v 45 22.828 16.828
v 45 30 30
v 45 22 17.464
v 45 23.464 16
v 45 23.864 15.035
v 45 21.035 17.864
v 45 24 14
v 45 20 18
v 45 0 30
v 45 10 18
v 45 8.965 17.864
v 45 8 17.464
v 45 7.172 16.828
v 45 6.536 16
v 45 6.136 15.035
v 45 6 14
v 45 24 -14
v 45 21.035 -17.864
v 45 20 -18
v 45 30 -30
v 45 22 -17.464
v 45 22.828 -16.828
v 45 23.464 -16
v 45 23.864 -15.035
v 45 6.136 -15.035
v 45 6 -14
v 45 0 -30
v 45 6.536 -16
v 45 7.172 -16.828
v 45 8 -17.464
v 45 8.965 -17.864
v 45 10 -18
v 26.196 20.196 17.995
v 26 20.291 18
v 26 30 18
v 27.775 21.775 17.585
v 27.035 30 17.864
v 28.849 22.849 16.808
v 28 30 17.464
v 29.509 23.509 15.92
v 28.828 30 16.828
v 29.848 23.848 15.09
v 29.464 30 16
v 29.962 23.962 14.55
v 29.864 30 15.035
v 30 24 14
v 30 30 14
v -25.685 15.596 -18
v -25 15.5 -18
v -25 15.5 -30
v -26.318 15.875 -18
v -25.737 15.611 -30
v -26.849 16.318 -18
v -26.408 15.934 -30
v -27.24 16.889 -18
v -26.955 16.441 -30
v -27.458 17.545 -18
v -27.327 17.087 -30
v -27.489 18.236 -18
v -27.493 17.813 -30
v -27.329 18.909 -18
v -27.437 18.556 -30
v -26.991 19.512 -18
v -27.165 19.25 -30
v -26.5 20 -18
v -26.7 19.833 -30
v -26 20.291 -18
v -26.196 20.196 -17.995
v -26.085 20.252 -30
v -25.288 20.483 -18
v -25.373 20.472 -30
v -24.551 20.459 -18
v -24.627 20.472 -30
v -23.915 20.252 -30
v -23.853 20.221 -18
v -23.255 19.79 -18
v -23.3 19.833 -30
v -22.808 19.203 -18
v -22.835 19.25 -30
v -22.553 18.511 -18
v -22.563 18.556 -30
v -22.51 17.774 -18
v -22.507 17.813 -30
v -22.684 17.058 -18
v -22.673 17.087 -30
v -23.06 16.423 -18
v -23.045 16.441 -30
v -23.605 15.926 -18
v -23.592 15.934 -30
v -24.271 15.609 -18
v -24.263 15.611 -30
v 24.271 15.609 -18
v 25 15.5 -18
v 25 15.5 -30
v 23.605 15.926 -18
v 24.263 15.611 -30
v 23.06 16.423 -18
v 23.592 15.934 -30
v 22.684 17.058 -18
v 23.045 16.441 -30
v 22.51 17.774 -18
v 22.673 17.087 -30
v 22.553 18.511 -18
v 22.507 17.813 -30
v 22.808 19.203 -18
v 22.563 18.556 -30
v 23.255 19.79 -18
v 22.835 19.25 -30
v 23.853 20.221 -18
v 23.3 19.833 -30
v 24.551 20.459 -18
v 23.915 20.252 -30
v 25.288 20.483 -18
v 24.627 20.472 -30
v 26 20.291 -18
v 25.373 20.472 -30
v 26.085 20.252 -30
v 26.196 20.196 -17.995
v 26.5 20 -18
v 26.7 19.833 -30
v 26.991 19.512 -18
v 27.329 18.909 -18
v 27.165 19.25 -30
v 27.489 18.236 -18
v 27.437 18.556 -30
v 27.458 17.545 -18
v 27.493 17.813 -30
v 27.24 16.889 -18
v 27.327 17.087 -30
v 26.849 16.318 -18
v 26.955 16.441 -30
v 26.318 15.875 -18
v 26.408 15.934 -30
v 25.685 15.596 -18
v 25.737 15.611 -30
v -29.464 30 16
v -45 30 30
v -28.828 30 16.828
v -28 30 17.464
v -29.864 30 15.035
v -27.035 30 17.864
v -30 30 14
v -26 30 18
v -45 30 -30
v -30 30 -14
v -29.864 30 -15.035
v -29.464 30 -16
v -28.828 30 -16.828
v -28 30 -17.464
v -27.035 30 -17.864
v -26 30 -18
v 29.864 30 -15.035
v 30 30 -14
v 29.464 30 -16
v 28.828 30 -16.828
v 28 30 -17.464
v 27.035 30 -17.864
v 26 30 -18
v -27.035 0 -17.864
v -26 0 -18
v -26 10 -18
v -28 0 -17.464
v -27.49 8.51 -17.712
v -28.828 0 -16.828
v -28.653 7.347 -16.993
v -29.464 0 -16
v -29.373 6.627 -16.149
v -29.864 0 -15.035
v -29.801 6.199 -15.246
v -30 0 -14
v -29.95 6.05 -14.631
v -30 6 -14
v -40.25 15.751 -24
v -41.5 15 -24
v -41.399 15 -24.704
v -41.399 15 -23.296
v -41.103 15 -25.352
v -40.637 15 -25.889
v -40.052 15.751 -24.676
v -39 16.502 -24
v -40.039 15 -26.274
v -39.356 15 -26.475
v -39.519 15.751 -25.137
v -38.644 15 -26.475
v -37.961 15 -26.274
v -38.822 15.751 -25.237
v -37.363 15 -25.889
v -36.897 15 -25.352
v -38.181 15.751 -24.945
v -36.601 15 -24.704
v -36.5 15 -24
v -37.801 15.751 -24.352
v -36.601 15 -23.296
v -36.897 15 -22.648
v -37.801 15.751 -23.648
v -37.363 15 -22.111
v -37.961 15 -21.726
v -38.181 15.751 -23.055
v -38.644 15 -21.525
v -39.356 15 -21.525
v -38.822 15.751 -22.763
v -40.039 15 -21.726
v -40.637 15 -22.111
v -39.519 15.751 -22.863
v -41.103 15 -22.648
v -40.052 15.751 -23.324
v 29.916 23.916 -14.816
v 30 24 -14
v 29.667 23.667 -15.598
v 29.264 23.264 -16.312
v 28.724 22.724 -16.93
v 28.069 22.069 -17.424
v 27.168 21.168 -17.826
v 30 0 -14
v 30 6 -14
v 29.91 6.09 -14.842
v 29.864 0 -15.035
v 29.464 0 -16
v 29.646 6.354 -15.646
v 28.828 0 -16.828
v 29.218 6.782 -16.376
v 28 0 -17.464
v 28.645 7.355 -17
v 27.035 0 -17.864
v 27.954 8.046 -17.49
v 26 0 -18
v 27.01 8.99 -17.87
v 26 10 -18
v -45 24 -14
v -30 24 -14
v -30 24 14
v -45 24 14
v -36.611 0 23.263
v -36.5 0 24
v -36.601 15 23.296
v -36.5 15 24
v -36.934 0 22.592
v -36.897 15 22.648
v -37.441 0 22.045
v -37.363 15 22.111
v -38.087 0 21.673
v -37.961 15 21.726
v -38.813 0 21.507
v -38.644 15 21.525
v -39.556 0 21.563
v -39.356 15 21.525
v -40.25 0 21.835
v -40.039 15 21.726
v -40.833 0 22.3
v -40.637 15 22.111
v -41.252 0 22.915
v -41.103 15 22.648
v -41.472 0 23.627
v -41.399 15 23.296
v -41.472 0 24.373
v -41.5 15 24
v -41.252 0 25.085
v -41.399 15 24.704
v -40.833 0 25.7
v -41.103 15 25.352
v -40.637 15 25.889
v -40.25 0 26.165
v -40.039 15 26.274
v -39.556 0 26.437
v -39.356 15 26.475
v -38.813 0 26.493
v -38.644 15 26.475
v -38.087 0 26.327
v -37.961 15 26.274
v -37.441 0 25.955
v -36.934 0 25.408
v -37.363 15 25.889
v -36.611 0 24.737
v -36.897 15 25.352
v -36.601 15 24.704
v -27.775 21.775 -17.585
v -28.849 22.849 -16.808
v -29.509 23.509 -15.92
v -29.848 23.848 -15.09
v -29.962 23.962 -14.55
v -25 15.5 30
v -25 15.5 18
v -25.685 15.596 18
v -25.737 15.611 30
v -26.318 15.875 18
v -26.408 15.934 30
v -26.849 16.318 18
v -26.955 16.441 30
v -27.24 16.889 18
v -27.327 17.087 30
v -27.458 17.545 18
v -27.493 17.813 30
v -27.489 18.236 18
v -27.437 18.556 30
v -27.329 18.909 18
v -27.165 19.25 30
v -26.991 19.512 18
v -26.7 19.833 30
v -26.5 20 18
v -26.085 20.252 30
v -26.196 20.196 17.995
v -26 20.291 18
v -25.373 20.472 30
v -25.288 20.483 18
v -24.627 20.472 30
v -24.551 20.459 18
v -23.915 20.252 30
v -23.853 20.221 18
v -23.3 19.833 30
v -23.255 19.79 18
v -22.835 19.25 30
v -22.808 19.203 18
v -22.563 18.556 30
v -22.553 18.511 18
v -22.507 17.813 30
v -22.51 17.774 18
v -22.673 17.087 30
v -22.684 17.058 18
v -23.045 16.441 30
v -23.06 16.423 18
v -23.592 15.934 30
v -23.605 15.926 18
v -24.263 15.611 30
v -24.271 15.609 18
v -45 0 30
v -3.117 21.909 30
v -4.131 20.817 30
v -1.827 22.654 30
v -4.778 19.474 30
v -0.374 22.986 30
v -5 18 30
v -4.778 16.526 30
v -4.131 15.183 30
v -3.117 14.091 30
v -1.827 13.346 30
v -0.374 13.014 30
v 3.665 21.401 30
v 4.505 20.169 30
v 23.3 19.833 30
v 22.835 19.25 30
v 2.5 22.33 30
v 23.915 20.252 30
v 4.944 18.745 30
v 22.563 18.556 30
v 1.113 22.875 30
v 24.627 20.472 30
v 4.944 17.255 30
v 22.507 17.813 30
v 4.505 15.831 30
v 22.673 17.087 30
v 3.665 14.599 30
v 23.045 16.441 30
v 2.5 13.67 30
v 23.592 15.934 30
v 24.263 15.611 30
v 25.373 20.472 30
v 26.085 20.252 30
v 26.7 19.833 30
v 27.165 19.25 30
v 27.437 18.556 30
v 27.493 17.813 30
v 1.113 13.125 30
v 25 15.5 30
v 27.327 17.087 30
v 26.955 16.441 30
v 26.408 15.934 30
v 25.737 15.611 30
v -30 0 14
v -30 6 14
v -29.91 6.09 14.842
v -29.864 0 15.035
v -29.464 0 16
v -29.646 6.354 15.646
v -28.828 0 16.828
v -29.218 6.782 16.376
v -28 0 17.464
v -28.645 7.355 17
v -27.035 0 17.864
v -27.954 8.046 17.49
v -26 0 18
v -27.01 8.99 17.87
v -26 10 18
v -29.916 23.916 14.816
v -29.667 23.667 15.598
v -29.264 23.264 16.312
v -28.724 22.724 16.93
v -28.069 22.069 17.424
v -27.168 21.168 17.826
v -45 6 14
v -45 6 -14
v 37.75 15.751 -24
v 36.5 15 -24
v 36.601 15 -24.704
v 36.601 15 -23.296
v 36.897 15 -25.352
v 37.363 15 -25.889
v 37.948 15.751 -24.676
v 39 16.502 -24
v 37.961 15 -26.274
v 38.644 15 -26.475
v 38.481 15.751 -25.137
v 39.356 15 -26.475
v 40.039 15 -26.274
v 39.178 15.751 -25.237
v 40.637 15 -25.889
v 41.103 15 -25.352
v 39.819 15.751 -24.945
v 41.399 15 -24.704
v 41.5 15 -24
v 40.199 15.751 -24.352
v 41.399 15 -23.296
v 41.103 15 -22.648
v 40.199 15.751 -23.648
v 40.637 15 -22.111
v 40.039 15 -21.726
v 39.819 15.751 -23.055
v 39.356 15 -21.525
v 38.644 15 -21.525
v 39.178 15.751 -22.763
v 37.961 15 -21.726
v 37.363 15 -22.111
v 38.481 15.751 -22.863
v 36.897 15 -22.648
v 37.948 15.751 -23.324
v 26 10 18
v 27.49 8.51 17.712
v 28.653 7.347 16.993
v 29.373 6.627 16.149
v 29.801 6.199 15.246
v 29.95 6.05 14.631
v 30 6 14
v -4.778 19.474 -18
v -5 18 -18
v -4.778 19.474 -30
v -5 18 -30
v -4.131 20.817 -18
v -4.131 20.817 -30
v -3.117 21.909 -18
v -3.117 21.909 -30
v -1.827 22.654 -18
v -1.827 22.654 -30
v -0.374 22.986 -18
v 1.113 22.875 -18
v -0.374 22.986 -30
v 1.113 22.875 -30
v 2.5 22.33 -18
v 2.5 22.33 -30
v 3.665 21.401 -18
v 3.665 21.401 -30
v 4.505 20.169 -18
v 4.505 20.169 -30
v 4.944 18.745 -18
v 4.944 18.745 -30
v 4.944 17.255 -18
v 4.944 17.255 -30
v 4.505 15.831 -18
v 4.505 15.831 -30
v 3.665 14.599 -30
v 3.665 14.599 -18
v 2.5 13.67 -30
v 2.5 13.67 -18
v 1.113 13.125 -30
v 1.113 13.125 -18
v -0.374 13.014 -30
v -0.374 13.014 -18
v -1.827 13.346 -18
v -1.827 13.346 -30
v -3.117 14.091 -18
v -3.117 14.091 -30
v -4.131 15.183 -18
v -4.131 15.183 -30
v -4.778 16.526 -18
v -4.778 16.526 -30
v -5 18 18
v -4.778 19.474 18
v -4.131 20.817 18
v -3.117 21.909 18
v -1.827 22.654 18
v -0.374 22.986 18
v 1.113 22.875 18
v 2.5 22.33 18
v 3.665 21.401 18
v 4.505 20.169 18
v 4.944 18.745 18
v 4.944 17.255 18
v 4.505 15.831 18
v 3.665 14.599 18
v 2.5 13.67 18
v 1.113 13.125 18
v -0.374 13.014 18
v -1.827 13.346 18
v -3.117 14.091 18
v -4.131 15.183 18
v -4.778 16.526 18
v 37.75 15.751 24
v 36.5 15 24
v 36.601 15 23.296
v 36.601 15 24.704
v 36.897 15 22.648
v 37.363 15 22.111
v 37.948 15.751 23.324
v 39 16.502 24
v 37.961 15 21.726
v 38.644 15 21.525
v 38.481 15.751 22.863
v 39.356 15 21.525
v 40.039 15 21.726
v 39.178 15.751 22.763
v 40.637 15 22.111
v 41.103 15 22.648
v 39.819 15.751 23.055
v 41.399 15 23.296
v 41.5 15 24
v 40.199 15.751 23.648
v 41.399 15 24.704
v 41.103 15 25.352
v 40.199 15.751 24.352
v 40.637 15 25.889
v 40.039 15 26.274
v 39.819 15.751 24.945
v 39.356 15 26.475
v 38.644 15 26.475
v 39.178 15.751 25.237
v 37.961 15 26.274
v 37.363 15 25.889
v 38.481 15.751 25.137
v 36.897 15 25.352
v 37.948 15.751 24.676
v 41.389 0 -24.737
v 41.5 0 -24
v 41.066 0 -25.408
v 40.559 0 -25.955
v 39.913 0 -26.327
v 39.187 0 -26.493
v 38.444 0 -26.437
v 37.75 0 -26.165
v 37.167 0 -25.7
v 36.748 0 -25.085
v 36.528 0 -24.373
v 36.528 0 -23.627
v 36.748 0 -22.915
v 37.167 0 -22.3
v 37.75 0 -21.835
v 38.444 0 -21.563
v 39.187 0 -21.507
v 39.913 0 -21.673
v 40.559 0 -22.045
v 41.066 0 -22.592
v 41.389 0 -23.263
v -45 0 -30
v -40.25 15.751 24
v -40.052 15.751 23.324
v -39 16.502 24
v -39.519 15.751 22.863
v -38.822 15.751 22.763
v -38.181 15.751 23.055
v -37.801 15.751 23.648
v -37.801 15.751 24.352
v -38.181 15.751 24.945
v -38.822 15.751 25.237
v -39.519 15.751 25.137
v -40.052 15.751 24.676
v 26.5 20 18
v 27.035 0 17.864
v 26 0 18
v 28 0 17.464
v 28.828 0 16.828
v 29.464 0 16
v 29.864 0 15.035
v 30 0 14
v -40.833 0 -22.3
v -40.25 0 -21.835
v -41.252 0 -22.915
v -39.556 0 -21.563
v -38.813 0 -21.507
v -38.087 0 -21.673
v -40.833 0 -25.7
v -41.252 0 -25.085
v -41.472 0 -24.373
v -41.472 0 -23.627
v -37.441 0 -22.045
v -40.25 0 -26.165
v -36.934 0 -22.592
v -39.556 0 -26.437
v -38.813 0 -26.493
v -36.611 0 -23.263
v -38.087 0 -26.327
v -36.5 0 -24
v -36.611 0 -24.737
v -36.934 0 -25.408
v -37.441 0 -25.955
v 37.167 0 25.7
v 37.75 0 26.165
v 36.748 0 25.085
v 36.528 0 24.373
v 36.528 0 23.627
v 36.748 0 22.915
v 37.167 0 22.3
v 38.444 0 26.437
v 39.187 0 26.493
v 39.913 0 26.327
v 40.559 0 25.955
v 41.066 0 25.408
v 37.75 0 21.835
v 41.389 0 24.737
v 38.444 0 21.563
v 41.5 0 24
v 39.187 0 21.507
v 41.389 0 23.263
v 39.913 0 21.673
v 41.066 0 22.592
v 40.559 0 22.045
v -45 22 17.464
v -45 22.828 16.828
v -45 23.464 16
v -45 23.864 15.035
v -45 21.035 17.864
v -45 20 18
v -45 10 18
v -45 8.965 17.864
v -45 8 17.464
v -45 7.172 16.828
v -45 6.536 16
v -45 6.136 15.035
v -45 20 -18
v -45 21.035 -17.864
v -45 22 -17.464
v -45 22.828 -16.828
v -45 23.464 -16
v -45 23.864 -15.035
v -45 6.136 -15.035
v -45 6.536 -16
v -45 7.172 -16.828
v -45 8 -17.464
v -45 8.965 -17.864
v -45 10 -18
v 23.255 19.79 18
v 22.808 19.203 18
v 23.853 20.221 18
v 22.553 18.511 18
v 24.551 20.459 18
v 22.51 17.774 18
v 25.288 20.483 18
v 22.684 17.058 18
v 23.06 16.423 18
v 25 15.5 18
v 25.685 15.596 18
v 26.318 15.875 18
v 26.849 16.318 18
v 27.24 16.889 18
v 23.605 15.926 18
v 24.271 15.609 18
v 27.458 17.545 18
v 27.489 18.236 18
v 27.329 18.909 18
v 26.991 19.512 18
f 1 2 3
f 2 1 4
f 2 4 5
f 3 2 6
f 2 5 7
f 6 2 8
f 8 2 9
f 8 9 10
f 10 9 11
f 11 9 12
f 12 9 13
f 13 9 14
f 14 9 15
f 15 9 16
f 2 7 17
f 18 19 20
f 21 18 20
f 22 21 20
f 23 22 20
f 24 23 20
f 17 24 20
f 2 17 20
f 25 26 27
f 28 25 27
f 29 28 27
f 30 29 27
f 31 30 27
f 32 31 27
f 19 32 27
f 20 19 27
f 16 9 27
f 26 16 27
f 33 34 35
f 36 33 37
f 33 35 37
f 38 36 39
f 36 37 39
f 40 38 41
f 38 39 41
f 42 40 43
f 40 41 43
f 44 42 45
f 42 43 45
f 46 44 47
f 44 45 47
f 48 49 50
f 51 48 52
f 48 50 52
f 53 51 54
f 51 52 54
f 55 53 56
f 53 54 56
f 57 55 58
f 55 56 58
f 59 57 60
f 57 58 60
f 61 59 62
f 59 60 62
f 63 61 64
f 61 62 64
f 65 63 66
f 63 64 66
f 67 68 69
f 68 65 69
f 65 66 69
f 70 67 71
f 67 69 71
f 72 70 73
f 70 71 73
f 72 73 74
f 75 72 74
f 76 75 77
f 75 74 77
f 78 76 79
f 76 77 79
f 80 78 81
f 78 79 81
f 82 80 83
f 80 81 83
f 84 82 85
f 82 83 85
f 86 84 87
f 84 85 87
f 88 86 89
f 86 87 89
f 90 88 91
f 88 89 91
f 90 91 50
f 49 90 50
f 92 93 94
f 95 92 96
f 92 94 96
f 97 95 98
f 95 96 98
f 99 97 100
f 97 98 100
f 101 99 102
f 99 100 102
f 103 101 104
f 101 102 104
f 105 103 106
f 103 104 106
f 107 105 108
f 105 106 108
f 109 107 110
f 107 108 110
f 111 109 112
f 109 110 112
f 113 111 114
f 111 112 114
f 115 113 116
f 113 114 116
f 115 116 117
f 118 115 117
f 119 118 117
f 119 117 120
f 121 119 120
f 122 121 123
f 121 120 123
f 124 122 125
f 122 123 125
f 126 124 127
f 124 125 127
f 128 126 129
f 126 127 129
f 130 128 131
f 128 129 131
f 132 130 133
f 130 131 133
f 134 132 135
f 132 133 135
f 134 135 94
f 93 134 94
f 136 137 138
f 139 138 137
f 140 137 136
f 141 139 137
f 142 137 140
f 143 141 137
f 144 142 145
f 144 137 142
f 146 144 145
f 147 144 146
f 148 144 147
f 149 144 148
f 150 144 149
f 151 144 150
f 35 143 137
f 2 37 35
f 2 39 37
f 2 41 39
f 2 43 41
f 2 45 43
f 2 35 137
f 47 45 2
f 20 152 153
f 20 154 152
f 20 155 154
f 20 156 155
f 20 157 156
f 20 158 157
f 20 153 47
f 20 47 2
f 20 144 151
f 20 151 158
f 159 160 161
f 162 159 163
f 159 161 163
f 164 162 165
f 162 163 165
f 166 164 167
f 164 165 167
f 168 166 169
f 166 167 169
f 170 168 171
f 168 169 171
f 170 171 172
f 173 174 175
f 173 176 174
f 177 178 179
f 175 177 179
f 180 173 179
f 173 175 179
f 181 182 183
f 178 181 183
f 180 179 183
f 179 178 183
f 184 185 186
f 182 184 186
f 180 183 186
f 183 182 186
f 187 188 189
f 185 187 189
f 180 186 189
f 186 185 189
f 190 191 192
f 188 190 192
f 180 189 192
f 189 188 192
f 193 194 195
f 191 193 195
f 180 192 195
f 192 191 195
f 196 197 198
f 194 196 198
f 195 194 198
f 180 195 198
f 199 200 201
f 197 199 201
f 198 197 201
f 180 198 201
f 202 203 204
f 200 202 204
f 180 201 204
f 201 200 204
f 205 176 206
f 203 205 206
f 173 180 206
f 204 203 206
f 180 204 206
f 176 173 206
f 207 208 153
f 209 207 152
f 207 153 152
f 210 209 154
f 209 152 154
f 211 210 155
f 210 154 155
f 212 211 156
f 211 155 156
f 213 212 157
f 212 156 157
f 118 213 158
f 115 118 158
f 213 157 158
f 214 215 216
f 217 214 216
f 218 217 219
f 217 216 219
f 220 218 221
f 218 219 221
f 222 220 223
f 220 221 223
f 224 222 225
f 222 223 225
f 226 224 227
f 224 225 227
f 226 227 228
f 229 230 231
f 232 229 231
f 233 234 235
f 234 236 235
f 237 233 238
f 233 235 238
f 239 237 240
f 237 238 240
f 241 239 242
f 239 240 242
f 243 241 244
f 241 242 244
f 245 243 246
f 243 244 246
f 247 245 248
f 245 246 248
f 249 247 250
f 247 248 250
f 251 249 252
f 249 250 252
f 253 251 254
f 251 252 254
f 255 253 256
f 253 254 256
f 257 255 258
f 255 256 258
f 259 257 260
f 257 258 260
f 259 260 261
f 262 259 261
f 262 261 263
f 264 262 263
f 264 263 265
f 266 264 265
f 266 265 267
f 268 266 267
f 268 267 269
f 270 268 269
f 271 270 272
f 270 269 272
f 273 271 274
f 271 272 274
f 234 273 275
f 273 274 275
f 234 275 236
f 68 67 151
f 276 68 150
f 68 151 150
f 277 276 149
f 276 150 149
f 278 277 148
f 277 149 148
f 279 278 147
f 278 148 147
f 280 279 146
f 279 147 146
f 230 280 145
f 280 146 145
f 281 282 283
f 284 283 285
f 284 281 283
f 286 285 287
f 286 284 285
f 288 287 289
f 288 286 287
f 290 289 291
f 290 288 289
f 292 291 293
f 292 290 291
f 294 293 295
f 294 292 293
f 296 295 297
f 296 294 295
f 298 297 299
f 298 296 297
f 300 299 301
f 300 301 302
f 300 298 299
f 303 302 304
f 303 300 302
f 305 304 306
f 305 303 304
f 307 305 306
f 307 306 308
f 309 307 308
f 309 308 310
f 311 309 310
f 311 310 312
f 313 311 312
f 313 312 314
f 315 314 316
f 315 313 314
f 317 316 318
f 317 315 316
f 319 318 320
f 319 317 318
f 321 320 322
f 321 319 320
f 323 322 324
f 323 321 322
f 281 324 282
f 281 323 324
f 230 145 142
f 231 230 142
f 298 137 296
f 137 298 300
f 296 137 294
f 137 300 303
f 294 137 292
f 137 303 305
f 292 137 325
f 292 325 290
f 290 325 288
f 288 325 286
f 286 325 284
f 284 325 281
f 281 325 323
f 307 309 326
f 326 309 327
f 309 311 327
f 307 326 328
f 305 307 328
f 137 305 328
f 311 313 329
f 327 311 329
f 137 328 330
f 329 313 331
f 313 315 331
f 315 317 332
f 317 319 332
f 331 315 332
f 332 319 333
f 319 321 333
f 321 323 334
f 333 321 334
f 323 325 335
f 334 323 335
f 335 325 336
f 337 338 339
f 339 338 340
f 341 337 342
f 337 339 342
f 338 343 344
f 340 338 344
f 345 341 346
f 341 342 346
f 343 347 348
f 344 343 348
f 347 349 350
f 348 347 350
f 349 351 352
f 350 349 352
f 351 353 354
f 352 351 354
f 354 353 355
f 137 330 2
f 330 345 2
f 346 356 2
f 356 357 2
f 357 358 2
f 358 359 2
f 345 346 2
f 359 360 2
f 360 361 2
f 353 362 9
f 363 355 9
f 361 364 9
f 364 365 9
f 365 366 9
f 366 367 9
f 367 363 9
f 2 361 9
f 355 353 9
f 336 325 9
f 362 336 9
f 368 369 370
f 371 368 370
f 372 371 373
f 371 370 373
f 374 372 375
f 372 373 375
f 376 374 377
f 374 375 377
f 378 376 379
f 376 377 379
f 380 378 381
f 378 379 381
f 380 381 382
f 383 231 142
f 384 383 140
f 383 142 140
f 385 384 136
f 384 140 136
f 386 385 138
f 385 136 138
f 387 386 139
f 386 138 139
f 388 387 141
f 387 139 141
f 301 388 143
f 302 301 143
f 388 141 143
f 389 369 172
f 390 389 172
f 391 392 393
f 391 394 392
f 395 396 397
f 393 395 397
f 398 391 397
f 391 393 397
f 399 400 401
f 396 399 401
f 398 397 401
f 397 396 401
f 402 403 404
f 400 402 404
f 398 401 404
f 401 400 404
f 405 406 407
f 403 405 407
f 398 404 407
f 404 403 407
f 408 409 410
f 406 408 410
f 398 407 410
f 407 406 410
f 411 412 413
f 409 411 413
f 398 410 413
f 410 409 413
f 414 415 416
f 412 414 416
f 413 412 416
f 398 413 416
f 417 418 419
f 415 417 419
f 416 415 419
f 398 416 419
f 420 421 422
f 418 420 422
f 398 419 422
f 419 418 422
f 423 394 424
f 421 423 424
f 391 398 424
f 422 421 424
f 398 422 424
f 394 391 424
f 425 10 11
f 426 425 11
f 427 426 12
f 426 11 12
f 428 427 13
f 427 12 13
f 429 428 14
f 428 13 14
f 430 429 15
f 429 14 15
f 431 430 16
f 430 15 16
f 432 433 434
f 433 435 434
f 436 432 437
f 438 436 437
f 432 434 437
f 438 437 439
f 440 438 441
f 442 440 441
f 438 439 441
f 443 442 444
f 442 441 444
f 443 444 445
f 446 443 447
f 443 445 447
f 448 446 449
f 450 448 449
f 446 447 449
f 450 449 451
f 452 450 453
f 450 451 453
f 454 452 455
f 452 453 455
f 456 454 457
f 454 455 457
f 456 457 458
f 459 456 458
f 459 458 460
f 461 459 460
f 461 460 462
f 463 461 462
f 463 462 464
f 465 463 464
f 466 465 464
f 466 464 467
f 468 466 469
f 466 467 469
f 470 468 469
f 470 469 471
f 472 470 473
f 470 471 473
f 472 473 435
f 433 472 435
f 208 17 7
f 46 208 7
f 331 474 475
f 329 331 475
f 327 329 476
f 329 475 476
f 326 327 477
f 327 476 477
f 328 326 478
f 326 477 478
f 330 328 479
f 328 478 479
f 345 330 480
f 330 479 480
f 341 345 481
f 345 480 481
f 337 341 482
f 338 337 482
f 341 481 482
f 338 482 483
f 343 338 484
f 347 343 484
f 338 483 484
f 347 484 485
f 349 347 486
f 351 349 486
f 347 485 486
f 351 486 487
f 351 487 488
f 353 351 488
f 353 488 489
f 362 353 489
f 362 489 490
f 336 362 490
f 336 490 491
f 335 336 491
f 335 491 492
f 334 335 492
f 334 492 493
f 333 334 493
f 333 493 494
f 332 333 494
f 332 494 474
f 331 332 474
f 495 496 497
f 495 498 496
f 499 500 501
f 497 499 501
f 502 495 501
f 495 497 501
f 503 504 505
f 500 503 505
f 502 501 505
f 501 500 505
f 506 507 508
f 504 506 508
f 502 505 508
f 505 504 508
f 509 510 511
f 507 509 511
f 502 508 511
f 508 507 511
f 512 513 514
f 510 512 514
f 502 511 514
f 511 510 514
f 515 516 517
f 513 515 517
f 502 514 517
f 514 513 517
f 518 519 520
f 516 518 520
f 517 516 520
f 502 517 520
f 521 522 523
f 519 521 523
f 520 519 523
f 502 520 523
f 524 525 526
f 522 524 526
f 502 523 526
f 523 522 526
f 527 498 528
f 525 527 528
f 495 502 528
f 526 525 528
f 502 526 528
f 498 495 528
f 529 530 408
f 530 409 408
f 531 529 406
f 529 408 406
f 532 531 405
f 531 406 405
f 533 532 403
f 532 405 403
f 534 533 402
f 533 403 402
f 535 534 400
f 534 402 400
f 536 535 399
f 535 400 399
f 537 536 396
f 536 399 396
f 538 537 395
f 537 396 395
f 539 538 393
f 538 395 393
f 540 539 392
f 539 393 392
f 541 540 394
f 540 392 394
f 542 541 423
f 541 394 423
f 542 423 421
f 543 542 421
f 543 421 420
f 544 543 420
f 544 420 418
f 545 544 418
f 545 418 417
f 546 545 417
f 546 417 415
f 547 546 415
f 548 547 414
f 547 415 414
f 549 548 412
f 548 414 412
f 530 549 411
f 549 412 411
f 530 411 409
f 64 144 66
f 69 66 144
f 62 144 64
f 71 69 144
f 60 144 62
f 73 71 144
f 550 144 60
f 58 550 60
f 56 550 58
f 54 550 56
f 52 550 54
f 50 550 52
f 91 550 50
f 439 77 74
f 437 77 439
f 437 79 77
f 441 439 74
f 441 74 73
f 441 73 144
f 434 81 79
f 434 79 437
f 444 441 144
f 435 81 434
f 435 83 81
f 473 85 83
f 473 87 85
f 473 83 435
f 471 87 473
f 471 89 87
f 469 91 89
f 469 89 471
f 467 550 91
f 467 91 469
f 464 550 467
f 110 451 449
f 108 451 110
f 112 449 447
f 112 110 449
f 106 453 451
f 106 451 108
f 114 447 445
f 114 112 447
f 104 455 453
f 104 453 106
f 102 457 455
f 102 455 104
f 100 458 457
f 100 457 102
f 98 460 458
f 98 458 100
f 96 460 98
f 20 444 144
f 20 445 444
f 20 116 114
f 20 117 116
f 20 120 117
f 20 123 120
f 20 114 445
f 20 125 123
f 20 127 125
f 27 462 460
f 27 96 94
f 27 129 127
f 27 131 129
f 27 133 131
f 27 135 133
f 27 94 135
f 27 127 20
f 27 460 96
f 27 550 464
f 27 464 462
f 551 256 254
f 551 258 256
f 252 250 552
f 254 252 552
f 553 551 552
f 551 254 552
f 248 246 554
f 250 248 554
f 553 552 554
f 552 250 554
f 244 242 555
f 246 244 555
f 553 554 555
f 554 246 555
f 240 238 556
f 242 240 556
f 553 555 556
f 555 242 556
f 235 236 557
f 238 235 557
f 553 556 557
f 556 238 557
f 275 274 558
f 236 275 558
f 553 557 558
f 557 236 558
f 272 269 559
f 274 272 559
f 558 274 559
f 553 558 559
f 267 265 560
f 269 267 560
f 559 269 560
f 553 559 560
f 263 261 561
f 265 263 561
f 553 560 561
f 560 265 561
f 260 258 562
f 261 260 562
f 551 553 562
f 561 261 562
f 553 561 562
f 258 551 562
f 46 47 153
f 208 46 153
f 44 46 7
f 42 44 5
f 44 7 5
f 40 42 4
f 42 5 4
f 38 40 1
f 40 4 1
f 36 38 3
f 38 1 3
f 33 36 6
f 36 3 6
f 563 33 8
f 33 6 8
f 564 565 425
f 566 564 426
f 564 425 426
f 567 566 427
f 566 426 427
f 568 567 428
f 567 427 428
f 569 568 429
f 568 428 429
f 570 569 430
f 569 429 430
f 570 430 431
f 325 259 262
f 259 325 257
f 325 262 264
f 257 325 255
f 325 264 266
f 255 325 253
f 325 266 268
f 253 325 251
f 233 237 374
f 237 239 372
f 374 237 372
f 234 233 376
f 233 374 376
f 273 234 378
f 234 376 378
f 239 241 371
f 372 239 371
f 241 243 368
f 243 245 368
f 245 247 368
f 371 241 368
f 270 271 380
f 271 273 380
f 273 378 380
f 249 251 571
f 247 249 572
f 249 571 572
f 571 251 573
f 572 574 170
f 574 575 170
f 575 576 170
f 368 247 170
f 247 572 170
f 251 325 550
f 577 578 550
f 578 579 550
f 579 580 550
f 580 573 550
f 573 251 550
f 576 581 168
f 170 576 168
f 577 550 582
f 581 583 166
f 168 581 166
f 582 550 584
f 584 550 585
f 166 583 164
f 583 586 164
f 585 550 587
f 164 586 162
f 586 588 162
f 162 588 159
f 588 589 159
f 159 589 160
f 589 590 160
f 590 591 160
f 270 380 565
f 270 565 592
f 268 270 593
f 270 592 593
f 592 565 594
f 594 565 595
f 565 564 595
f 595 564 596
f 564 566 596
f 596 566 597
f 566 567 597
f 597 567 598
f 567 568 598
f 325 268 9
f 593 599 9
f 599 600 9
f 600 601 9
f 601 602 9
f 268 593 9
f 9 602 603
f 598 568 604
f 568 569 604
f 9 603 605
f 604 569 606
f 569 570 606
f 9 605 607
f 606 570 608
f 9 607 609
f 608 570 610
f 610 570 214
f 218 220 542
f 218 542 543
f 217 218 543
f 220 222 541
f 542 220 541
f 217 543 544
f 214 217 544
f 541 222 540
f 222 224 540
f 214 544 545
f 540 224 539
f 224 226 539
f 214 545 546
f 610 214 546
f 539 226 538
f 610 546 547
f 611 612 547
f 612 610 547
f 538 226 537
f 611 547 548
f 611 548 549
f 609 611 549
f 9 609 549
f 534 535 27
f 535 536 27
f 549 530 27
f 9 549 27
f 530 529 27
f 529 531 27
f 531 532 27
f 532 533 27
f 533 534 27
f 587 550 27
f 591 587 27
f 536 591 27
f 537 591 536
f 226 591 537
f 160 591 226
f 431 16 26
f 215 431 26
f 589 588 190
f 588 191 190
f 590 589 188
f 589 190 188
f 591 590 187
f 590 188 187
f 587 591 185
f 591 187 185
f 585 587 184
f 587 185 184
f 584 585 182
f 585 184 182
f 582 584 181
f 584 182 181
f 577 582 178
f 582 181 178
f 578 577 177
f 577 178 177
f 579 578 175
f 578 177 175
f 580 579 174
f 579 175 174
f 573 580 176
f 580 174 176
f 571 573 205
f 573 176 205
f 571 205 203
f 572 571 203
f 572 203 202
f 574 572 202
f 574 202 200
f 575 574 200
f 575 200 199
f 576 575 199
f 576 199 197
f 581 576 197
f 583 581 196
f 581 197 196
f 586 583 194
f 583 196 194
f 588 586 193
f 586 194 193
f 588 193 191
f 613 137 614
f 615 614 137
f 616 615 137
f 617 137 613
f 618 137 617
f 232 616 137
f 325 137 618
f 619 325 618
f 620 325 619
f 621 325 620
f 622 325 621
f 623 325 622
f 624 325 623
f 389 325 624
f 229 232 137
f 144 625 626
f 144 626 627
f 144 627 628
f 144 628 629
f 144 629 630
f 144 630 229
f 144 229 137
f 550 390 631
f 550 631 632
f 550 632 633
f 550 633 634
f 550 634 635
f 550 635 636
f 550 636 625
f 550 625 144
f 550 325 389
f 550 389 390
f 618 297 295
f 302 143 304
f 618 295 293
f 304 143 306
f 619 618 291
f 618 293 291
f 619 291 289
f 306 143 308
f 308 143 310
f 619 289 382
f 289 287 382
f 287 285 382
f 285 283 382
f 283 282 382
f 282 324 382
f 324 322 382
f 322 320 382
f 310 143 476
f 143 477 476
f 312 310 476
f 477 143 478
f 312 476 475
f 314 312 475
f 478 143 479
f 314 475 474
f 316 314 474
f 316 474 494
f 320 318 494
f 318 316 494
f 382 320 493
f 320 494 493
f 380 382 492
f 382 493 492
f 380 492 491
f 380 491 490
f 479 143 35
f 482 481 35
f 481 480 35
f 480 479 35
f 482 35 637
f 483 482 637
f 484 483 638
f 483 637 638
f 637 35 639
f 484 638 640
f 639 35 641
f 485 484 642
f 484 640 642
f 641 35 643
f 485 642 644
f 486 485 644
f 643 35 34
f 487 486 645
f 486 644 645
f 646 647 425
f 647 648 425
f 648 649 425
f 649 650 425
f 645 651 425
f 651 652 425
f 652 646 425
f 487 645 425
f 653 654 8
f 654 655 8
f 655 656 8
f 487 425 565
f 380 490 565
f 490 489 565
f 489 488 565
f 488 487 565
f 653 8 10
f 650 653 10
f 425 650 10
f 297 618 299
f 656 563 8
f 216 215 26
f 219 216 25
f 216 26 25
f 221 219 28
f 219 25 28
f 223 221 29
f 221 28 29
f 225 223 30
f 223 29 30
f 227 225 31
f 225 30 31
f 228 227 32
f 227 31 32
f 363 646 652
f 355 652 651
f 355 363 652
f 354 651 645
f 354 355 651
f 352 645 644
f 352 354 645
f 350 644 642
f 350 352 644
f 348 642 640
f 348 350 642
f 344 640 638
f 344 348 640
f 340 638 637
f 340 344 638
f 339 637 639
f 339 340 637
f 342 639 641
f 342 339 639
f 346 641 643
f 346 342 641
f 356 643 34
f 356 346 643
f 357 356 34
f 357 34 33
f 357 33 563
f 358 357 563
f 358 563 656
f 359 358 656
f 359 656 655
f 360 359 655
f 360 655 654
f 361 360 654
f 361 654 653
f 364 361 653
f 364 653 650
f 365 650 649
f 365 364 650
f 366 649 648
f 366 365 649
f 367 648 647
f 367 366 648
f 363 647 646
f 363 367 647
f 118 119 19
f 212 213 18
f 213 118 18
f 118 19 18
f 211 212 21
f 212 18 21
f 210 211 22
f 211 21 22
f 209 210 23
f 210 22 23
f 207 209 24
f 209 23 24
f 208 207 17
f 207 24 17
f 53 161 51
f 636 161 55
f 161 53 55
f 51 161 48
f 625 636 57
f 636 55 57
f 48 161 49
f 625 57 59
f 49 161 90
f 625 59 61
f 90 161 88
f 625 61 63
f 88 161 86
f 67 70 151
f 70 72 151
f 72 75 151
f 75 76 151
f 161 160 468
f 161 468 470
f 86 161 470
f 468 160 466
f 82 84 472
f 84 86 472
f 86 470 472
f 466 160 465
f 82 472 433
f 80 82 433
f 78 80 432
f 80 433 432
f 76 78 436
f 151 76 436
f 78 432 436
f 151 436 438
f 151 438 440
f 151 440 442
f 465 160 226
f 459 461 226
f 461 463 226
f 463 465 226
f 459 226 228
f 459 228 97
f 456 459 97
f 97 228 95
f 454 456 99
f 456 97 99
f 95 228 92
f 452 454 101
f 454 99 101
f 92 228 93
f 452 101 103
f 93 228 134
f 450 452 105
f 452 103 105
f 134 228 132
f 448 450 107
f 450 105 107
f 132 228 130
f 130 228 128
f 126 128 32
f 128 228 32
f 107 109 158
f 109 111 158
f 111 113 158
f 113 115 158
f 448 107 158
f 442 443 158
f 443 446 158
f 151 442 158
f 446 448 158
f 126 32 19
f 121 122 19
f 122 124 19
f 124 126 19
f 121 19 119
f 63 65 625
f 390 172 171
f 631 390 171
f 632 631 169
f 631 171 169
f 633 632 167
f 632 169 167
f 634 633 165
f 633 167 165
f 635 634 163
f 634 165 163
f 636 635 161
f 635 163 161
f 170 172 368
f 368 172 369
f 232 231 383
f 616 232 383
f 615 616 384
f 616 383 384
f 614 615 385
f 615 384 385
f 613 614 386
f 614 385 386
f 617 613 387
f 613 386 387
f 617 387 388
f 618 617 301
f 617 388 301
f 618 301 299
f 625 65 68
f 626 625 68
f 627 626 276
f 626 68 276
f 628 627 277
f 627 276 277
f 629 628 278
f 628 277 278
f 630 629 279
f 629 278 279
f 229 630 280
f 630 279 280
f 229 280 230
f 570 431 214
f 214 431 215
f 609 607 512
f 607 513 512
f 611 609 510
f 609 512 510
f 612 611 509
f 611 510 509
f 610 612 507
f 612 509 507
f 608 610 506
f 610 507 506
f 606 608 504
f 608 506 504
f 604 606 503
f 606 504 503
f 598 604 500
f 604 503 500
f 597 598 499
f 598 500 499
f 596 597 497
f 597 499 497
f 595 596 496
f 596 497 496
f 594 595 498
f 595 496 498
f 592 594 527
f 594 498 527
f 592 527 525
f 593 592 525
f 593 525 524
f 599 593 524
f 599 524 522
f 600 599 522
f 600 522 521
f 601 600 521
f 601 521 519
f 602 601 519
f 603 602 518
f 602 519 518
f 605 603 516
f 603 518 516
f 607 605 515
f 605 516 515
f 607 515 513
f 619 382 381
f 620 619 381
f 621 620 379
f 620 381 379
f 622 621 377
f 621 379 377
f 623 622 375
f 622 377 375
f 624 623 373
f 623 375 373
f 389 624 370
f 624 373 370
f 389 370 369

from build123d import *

# Parameters (mm, degrees)
SKETCH_1_W                  = 90
SKETCH_1_H                  = 60
EXTRUDE_1_DEPTH             = 30
HOLE_WIZARD_1_D             = 10
HOLE_WIZARD_M6_1_AT_2_COUNT = 2
HOLE_WIZARD_M6_1_AT_2_PITCH = 50
CUT_EXTRUDE_1_DEPTH         = 62.846584384
HOLE_WIZARD_M6_2_D          = 5
HOLE_WIZARD_M6_2_DEPTH      = 15
HOLE_WIZARD_M6_2_TIP        = 1.502151548
CUT_EXTRUDE_2_DEPTH         = 100.498743771


with BuildPart() as part:
    # 草图1 → 凸台-拉伸1 (new body)
    with BuildSketch(Plane(origin=(0, 0, 0), x_dir=(1, 0, 0), z_dir=(0, 1, 0))):
        Rectangle(SKETCH_1_W, SKETCH_1_H)
    extrude(amount=EXTRUDE_1_DEPTH)

    # 孔1 (through all)
    with Locations(Plane.XY.offset(30)):
        with Locations((0, 18)):
            Hole(HOLE_WIZARD_1_D / 2)

    # 草图4 → M6 螺纹孔1 (revolve, cut)
    with BuildSketch(Plane(origin=(-25, 18, 30), x_dir=(0, -1, 0), z_dir=(1, 0, 0))):
        Polygon((0, 0), (0, 16.502151548), (2.5, 15), (2.5, 0), align=None)
    hole_wizard_m6_1 = revolve(axis=Axis((-25, 18, 36.35), (0, 0, -1)), mode=Mode.SUBTRACT)

    # M6 螺纹孔1 at 2: M6 螺纹孔1 ×2
    with Locations(*[(i * HOLE_WIZARD_M6_1_AT_2_PITCH, 0, 0) for i in range(1, HOLE_WIZARD_M6_1_AT_2_COUNT)]):
        add(hole_wizard_m6_1, mode=Mode.SUBTRACT)

    # 镜向1: M6 螺纹孔1 across plane
    add(hole_wizard_m6_1.mirror(Plane.XY), mode=Mode.SUBTRACT)

    # 镜向1 copy 1 sketch → 镜向1 copy 1 (revolve, cut)
    with BuildSketch(Plane(origin=(25, 18, -30), x_dir=(0, -1, 0), z_dir=(1, 0, 0))):
        Polygon((0, 0), (0, -16.502151548), (2.5, -15), (2.5, 0), align=None)
    revolve(axis=Axis((25, 18, -36.35), (0, 0, -1)), mode=Mode.SUBTRACT)

    # 草图6 → 切除-拉伸1 (cut, through all)
    with BuildSketch(Plane(origin=(0, 30, 0), x_dir=(1, 0, 0), z_dir=(0, 1, 0))):
        with BuildLine():
            Line((-26, -18), (26, -18))
            ThreePointArc((26, -18), (28.828427125, -16.828427125), (30, -14))
            Line((30, -14), (30, 14))
            ThreePointArc((30, 14), (28.828427125, 16.828427125), (26, 18))
            Line((26, 18), (-26, 18))
            ThreePointArc((-26, 18), (-28.828427125, 16.828427125), (-30, 14))
            Line((-30, 14), (-30, -14))
            ThreePointArc((-30, -14), (-28.828427125, -16.828427125), (-26, -18))
        make_face()
    extrude(amount=-CUT_EXTRUDE_1_DEPTH, mode=Mode.SUBTRACT)

    # M6 螺纹孔2
    with Locations(Plane(origin=(0, 0, 0), x_dir=(-1, 0, 0), z_dir=(0, -1, 0))):
        with Locations((-39, -24), (39, -24), (39, 24), (-39, 24)):
            Hole(HOLE_WIZARD_M6_2_D / 2, depth=HOLE_WIZARD_M6_2_DEPTH)
            with Locations((0, 0, -(HOLE_WIZARD_M6_2_DEPTH + HOLE_WIZARD_M6_2_TIP / 2))):  # 118° drill point
                Cone(0, HOLE_WIZARD_M6_2_D / 2, HOLE_WIZARD_M6_2_TIP, mode=Mode.SUBTRACT)

    # 草图9 → 切除-拉伸2 (cut, through all)
    with BuildSketch(Plane(origin=(45, 0, 0), x_dir=(0, 0, -1), z_dir=(1, 0, 0))):
        with BuildLine():
            Line((-14, 6), (14, 6))
            ThreePointArc((14, 6), (16.828427125, 7.171572875), (18, 10))
            Line((18, 10), (18, 20))
            ThreePointArc((18, 20), (16.828427125, 22.828427125), (14, 24))
            Line((14, 24), (-14, 24))
            ThreePointArc((-14, 24), (-16.828427125, 22.828427125), (-18, 20))
            Line((-18, 20), (-18, 10))
            ThreePointArc((-18, 10), (-16.828427125, 7.171572875), (-14, 6))
        make_face()
    extrude(amount=-CUT_EXTRUDE_2_DEPTH, mode=Mode.SUBTRACT)


solid = part.part
